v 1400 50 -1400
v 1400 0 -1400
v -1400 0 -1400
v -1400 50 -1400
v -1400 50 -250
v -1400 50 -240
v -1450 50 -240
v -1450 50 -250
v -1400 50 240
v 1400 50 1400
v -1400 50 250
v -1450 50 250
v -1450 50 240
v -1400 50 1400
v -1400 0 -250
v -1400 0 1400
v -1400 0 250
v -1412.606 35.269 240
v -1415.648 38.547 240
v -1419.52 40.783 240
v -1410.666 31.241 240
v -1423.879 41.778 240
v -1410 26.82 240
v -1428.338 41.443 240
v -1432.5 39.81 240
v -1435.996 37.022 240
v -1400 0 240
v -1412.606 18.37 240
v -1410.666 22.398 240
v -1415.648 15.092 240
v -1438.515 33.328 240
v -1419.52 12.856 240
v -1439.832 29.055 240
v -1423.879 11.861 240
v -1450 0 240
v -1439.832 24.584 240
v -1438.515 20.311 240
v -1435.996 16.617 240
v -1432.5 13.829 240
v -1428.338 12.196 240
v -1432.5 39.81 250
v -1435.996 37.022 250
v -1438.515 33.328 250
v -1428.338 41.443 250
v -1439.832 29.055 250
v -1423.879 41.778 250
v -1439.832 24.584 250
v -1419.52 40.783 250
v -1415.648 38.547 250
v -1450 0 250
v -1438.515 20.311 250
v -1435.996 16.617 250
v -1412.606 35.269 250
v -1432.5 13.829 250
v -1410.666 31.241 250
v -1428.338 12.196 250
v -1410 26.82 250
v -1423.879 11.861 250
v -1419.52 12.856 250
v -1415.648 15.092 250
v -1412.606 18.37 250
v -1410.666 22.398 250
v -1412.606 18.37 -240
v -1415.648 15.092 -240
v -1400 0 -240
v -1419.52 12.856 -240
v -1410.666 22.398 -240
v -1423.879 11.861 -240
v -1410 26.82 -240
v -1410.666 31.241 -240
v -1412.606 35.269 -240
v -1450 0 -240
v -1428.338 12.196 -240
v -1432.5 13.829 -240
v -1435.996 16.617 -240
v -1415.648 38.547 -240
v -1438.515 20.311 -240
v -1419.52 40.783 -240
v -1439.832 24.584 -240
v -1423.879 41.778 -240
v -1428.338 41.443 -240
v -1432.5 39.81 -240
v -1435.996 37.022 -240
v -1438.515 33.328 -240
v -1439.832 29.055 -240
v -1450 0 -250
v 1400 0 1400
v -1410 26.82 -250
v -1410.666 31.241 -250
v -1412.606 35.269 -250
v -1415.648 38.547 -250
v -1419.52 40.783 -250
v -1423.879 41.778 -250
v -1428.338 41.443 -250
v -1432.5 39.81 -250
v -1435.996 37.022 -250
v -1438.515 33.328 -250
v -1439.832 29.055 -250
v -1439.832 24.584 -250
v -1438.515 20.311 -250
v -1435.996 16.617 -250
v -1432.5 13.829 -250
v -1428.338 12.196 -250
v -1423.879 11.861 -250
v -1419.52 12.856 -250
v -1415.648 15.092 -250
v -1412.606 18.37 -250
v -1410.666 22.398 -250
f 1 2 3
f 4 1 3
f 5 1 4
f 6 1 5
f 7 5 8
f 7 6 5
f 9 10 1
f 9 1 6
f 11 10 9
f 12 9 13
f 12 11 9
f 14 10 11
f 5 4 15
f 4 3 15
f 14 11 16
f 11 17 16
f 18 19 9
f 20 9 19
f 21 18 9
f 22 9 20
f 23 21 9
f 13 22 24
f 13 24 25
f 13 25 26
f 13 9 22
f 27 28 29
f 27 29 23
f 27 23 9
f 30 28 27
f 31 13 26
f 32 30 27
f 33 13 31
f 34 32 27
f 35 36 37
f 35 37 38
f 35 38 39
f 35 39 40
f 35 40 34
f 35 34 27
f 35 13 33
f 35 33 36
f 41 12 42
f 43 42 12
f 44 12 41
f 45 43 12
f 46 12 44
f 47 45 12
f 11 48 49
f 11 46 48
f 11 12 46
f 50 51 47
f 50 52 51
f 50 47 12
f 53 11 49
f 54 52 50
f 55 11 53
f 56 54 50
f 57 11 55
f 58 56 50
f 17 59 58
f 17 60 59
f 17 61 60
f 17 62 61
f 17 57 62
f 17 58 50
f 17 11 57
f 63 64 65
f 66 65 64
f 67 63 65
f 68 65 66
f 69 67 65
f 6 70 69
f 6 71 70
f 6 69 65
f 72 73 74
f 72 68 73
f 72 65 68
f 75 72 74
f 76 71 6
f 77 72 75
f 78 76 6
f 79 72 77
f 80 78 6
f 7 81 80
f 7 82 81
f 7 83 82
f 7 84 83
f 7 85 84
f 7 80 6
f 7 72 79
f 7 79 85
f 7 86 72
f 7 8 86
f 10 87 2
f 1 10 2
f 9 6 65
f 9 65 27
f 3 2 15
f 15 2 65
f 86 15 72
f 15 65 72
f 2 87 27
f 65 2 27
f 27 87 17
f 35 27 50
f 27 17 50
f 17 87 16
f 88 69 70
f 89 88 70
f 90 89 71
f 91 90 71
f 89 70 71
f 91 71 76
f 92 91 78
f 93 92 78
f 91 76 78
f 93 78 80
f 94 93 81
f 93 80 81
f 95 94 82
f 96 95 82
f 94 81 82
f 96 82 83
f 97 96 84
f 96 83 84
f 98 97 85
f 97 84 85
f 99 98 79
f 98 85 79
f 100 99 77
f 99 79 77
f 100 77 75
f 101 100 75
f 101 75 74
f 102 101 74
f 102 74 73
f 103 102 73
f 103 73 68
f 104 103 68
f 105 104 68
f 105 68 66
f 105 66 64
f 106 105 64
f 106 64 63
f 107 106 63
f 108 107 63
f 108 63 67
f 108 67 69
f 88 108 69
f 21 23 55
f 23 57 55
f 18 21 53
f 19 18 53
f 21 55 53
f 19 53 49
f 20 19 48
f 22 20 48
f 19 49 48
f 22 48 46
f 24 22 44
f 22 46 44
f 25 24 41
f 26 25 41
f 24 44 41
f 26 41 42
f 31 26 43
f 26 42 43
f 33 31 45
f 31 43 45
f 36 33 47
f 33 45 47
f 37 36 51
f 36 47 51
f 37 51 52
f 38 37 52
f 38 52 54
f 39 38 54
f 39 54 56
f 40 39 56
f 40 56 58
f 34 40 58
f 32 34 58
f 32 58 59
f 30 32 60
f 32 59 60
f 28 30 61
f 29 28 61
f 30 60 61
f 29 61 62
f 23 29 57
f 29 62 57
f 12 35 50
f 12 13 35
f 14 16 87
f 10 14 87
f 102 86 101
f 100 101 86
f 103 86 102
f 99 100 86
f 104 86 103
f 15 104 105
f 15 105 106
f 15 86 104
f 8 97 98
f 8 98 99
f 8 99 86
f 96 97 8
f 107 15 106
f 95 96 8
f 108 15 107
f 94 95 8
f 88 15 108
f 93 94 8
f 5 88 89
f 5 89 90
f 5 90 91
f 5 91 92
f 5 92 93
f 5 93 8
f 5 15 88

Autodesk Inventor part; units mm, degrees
ref_plane "YZ Plane" through (0, 0, 0) normal (1, 0, 0) x (0, 1, 0)
ref_plane "XZ Plane" through (0, 0, 0) normal (0, 1, 0) x (-1, 0, 0)
ref_plane "XY Plane" through (0, 0, 0) normal (0, 0, 1) x (1, 0, 0)
sketch "Sketch1" plane through (0, 0, 0) normal (0, 1, 0) x (-1, 0, 0)
  line L0 (1400, 1400) -> (-1400, 1400)
  line L1 (-1400, 1400) -> (-1400, -1400)
  line L2 (-1400, -1400) -> (1400, -1400)
  line L3 (1400, -1400) -> (1400, 1400)
  point P0 (0, 0)
  dimension "d0" = 2800
  dimension "d1" = 2800
  dimension "d2" = 1400
  dimension "d3" = 1400
extrude "Extrusion1" add sketch "Sketch1" along normal blind 50
sketch "Sketch2" plane through (-1400, 0, -1400) normal (-1, 0, 0) x (0, 0, 1)
  line L0 (2800, 50) -> (0, 50) projected
  line L1 (2800, 0) -> (0, 0) projected
  line L2 (1150, 50) -> (1650, 50)
  line L3 (1650, 50) -> (1650, 0)
  line L4 (1650, 0) -> (1150, 0)
  line L5 (1150, 0) -> (1150, 50)
  line L6 (0, 0) -> (0, 50) projected
  point P0 (1400, 0)
  dimension "d6" = 500
  dimension "d7" = 1150
extrude "Extrusion2" add sketch "Sketch2" along normal blind 50 contours L3 L1 L5 L0
sketch "Sketch4" plane through (-1450, 0, -1400) normal (-1, 0, 0) x (0, 0, 1)
  line L0 (2800, 0) -> (0, 0) projected
  line L1 (1160, 50) -> (1640, 50)
  line L2 (1640, 50) -> (1640, 0)
  line L3 (1640, 0) -> (1160, 0)
  line L4 (1160, 0) -> (1160, 50)
  line L5 (1650, 50) -> (1150, 50) projected
  line L6 (1150, 50) -> (1150, 0) projected
  line L7 (1650, 0) -> (1650, 50) projected
  point P0 (1400, 0)
  point P1 (1160, 0)
  dimension "d10" = 0
  dimension "d11" = 10
  dimension "d12" = 10
extrude "Extrusion3" cut sketch "Sketch4" against normal blind 50 contours L0 L4 L1 L2
sketch "Sketch5" plane through (-1400, 0, 250) normal (0, 0, 1) x (1, 0, 0)
  circle A0 centre (-25, 26.8195) radius 15
  line L0 (-50, 0) -> (-50, 50) projected
  point P0 (1400, 0)
  dimension "d15" = 30
  dimension "d16" = 25
extrude "Extrusion4" cut sketch "Sketch5" against normal blind 700
sketch "Sketch6" plane through (-1400, 0, -1400) normal (-1, 0, 0) x (0, 0, 1)
  point P0 (1400, 0)
properties part number "cube lid"
